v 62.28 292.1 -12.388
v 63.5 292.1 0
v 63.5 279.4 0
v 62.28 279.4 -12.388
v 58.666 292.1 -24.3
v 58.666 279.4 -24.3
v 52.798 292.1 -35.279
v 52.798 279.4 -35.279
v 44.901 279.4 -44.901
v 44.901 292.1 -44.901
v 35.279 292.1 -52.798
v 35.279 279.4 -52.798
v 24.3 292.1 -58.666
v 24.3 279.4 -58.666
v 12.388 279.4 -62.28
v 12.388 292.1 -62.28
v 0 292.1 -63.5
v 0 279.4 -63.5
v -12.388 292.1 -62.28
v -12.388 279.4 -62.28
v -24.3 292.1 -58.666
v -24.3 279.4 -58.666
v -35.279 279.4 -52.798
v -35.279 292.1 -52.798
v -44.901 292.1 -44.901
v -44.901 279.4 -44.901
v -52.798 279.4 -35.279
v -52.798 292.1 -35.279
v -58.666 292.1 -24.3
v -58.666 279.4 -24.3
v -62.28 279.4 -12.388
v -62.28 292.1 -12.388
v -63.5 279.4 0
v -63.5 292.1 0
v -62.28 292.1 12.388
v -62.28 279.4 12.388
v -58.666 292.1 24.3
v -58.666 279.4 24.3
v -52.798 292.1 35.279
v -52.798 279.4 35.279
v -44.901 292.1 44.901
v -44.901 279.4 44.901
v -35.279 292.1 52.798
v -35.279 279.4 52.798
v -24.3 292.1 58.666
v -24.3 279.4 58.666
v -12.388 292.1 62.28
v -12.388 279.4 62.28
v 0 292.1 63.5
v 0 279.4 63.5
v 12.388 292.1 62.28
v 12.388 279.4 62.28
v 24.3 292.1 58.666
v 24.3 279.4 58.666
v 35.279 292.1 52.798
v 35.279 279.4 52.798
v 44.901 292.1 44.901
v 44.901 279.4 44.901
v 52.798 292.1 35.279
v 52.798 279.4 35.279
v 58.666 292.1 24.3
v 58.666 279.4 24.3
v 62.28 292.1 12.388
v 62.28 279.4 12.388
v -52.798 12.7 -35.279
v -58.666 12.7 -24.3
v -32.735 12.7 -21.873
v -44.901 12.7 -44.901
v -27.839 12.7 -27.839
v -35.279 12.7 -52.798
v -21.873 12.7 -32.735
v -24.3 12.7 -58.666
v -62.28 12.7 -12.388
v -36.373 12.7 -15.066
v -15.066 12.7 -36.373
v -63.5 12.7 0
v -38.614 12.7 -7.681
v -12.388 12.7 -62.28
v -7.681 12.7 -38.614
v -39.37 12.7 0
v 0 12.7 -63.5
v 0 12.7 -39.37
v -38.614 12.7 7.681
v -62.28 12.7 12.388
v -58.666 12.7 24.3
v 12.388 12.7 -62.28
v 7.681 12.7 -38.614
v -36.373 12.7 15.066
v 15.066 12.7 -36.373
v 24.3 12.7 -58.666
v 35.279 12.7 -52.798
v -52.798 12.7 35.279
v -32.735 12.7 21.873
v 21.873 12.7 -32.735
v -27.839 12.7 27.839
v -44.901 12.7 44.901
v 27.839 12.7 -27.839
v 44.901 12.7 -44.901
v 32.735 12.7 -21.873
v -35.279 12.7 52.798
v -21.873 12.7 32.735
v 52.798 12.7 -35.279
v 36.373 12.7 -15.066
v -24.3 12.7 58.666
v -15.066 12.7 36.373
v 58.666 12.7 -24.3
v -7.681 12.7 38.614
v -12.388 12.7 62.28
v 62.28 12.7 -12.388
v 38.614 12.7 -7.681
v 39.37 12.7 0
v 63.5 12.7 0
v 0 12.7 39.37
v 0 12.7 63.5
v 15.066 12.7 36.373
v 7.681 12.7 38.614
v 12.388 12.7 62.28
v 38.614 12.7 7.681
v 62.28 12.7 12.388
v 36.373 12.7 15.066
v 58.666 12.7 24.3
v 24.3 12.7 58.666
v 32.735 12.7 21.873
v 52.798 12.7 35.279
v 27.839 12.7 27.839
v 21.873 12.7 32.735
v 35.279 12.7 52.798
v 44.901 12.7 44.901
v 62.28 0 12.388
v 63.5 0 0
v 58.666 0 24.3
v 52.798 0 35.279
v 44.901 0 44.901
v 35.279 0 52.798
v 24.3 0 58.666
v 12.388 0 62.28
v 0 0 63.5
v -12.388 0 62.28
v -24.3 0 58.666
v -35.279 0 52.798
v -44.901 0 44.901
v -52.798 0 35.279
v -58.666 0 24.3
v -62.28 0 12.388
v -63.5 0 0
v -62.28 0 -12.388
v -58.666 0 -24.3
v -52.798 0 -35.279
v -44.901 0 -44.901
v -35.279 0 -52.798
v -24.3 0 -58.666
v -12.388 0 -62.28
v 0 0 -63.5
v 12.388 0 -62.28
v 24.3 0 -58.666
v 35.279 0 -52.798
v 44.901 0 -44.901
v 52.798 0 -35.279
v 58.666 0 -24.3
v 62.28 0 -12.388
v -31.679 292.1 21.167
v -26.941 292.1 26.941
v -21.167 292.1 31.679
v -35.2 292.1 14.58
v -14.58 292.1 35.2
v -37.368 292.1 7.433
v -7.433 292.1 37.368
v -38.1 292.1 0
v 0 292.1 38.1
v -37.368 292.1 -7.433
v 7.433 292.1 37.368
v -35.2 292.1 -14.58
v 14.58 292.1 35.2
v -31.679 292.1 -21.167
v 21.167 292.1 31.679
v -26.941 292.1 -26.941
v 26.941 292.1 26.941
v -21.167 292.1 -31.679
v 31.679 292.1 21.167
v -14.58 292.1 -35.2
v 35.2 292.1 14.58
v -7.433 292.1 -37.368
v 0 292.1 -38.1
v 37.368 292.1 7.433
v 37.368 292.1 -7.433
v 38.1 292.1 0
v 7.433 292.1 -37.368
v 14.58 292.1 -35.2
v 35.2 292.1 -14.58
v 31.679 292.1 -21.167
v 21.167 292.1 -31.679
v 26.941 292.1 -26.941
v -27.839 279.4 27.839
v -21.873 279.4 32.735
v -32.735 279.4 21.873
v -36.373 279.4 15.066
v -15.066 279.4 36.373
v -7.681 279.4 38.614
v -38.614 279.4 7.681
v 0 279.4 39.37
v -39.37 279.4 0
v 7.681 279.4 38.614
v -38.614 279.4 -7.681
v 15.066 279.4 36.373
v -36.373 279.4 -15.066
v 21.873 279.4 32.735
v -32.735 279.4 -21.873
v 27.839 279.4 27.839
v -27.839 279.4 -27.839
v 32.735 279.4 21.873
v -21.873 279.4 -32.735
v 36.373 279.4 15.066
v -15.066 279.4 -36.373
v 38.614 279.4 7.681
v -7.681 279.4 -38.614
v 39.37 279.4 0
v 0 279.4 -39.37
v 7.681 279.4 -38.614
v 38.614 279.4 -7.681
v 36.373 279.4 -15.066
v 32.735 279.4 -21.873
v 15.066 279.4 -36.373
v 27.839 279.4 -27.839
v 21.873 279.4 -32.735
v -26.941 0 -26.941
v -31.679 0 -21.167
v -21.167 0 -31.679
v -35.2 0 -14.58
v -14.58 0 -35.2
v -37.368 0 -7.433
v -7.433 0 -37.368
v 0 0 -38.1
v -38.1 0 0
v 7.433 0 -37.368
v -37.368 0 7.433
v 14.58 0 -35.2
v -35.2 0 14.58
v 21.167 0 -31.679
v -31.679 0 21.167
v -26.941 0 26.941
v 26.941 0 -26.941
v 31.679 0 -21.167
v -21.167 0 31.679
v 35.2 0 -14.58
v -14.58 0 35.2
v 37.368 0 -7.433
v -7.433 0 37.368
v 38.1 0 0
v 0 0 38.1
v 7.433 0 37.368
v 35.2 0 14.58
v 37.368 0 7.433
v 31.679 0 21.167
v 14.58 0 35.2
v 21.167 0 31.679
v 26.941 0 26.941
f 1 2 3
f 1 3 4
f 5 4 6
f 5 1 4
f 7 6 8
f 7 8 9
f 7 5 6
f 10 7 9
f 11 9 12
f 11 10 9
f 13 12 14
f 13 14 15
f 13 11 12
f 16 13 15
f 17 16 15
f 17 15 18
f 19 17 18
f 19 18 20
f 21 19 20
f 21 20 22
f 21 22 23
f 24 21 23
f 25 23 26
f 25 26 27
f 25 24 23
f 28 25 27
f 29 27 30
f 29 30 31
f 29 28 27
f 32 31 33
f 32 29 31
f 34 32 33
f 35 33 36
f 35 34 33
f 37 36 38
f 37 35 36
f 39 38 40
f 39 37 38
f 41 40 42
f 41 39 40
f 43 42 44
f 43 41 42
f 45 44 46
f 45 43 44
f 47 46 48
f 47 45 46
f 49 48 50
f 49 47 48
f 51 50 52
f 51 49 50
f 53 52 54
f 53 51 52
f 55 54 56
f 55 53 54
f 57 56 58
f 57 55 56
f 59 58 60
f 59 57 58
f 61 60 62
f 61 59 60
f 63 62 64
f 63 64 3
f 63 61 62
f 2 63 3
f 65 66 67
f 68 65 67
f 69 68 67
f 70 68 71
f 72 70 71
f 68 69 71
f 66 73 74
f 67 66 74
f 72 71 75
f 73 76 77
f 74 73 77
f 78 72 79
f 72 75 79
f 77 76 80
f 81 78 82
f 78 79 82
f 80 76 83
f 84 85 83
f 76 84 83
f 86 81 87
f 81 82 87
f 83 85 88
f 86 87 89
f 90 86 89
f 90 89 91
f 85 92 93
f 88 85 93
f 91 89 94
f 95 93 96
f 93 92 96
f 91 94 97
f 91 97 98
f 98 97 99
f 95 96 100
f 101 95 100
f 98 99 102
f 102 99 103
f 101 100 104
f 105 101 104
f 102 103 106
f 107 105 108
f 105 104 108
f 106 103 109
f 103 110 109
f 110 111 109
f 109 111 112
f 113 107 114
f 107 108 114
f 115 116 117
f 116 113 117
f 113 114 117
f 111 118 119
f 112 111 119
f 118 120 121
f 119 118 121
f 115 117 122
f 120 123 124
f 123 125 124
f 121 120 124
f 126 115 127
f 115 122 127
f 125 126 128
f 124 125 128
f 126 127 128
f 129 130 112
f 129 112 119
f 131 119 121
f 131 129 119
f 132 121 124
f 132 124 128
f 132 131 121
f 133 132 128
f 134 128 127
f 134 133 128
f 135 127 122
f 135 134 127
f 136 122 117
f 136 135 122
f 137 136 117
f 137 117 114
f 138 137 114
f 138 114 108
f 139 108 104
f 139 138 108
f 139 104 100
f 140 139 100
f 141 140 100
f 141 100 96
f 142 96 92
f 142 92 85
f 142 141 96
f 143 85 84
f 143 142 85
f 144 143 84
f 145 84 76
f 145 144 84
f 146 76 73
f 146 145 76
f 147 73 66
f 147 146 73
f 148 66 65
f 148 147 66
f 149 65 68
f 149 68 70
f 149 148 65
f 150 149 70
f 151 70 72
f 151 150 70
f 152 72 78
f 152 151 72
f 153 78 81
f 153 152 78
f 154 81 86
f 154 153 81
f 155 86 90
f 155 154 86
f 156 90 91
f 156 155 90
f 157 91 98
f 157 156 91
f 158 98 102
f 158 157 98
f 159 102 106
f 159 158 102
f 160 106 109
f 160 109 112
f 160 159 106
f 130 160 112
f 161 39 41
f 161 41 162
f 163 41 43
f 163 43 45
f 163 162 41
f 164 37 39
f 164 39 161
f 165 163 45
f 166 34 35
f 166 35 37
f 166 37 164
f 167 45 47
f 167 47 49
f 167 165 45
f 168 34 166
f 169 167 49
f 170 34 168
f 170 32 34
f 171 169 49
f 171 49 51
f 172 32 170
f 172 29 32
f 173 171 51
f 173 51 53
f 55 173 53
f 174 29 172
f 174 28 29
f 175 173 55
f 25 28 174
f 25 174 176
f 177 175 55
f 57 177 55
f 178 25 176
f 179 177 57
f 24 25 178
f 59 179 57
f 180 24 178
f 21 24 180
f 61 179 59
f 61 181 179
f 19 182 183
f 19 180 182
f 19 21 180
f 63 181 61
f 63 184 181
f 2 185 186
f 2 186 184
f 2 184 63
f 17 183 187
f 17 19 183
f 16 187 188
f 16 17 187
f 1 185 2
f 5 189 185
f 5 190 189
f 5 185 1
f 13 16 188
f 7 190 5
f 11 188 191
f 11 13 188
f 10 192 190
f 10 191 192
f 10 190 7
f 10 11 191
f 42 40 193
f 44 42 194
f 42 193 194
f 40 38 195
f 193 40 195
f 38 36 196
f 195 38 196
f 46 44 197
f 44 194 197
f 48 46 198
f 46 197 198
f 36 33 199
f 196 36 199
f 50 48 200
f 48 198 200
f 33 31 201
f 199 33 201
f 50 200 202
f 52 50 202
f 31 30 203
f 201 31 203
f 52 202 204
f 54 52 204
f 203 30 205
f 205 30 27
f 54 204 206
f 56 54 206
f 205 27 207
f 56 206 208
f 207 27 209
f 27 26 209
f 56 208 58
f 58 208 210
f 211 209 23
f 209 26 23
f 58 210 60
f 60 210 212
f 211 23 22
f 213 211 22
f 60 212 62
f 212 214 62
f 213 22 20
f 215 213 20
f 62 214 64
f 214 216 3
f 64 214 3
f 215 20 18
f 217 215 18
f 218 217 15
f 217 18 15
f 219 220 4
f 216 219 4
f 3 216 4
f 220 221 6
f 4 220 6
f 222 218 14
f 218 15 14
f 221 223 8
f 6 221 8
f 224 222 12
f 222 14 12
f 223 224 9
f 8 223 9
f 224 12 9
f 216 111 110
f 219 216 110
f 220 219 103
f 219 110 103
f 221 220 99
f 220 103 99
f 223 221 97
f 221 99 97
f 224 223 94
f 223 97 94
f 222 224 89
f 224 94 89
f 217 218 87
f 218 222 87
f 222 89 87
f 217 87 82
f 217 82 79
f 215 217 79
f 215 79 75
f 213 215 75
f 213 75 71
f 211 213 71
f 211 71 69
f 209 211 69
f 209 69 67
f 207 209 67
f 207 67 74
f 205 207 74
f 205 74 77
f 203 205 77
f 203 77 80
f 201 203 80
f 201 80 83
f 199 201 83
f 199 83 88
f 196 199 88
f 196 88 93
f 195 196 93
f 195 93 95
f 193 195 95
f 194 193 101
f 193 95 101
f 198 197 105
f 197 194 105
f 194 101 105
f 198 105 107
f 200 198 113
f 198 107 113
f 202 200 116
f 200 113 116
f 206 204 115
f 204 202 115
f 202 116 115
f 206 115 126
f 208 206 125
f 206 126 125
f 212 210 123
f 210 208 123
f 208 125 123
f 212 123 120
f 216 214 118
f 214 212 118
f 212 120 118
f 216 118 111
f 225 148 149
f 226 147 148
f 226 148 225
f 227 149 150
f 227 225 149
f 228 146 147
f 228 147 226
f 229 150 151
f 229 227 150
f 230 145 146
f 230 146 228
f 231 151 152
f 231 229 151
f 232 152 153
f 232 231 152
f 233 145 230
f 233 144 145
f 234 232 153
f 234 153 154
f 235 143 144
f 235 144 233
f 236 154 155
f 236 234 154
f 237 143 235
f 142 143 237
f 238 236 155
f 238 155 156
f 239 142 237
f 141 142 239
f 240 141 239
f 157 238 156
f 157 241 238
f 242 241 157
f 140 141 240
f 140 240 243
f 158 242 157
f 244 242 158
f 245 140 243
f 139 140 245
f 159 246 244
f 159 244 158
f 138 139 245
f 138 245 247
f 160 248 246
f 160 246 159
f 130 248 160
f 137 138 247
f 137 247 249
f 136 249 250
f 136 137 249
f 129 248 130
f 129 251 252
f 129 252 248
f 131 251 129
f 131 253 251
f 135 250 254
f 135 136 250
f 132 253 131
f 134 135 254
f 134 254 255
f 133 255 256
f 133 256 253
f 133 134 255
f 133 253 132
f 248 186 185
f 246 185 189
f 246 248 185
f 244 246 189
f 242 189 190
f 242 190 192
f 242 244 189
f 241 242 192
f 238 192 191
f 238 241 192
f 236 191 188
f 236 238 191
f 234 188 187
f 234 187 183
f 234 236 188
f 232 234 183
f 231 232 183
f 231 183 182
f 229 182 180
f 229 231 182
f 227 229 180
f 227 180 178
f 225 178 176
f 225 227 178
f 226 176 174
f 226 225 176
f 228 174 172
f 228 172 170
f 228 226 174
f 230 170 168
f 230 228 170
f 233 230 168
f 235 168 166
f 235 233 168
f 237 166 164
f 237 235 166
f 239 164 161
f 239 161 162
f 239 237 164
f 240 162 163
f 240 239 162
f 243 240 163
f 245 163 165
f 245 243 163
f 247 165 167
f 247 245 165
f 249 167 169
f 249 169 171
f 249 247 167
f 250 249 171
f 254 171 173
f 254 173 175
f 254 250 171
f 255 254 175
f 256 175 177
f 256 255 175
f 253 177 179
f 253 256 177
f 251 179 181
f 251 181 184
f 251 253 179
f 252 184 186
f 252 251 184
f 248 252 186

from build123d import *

# Parameters (mm, degrees)
SKETCH2_R            = 39.37
SKETCH2_R_2          = 38.1
BASE_CYLINDER_DEPTH  = 292.1
SKETCH3_R            = 63.5
SKETCH3_R_2          = 38.1
AFT_FLANGE_DEPTH     = 12.7
SKETCH4_R            = 63.5
SKETCH4_R_2          = 38.1
FORWARD_FLANGE_DEPTH = 12.7


with BuildPart() as part:
    # Sketch2 → Base Cylinder (new body)
    with BuildSketch(Plane(origin=(0, 0, 0), x_dir=(1, 0, 0), z_dir=(0, 1, 0))):
        Circle(SKETCH2_R)
        Circle(SKETCH2_R_2, mode=Mode.SUBTRACT)
    extrude(amount=BASE_CYLINDER_DEPTH)

    # Sketch3 → Aft Flange (add)
    with BuildSketch(Plane.XZ):
        Circle(SKETCH3_R)
        Circle(SKETCH3_R_2, mode=Mode.SUBTRACT)
    extrude(amount=-AFT_FLANGE_DEPTH)

    # Sketch4 → Forward Flange (add)
    with BuildSketch(Plane(origin=(0, 292.1, 0), x_dir=(1, 0, 0), z_dir=(0, 1, 0))):
        Circle(SKETCH4_R)
        Circle(SKETCH4_R_2, mode=Mode.SUBTRACT)
    extrude(amount=-FORWARD_FLANGE_DEPTH)


solid = part.part
